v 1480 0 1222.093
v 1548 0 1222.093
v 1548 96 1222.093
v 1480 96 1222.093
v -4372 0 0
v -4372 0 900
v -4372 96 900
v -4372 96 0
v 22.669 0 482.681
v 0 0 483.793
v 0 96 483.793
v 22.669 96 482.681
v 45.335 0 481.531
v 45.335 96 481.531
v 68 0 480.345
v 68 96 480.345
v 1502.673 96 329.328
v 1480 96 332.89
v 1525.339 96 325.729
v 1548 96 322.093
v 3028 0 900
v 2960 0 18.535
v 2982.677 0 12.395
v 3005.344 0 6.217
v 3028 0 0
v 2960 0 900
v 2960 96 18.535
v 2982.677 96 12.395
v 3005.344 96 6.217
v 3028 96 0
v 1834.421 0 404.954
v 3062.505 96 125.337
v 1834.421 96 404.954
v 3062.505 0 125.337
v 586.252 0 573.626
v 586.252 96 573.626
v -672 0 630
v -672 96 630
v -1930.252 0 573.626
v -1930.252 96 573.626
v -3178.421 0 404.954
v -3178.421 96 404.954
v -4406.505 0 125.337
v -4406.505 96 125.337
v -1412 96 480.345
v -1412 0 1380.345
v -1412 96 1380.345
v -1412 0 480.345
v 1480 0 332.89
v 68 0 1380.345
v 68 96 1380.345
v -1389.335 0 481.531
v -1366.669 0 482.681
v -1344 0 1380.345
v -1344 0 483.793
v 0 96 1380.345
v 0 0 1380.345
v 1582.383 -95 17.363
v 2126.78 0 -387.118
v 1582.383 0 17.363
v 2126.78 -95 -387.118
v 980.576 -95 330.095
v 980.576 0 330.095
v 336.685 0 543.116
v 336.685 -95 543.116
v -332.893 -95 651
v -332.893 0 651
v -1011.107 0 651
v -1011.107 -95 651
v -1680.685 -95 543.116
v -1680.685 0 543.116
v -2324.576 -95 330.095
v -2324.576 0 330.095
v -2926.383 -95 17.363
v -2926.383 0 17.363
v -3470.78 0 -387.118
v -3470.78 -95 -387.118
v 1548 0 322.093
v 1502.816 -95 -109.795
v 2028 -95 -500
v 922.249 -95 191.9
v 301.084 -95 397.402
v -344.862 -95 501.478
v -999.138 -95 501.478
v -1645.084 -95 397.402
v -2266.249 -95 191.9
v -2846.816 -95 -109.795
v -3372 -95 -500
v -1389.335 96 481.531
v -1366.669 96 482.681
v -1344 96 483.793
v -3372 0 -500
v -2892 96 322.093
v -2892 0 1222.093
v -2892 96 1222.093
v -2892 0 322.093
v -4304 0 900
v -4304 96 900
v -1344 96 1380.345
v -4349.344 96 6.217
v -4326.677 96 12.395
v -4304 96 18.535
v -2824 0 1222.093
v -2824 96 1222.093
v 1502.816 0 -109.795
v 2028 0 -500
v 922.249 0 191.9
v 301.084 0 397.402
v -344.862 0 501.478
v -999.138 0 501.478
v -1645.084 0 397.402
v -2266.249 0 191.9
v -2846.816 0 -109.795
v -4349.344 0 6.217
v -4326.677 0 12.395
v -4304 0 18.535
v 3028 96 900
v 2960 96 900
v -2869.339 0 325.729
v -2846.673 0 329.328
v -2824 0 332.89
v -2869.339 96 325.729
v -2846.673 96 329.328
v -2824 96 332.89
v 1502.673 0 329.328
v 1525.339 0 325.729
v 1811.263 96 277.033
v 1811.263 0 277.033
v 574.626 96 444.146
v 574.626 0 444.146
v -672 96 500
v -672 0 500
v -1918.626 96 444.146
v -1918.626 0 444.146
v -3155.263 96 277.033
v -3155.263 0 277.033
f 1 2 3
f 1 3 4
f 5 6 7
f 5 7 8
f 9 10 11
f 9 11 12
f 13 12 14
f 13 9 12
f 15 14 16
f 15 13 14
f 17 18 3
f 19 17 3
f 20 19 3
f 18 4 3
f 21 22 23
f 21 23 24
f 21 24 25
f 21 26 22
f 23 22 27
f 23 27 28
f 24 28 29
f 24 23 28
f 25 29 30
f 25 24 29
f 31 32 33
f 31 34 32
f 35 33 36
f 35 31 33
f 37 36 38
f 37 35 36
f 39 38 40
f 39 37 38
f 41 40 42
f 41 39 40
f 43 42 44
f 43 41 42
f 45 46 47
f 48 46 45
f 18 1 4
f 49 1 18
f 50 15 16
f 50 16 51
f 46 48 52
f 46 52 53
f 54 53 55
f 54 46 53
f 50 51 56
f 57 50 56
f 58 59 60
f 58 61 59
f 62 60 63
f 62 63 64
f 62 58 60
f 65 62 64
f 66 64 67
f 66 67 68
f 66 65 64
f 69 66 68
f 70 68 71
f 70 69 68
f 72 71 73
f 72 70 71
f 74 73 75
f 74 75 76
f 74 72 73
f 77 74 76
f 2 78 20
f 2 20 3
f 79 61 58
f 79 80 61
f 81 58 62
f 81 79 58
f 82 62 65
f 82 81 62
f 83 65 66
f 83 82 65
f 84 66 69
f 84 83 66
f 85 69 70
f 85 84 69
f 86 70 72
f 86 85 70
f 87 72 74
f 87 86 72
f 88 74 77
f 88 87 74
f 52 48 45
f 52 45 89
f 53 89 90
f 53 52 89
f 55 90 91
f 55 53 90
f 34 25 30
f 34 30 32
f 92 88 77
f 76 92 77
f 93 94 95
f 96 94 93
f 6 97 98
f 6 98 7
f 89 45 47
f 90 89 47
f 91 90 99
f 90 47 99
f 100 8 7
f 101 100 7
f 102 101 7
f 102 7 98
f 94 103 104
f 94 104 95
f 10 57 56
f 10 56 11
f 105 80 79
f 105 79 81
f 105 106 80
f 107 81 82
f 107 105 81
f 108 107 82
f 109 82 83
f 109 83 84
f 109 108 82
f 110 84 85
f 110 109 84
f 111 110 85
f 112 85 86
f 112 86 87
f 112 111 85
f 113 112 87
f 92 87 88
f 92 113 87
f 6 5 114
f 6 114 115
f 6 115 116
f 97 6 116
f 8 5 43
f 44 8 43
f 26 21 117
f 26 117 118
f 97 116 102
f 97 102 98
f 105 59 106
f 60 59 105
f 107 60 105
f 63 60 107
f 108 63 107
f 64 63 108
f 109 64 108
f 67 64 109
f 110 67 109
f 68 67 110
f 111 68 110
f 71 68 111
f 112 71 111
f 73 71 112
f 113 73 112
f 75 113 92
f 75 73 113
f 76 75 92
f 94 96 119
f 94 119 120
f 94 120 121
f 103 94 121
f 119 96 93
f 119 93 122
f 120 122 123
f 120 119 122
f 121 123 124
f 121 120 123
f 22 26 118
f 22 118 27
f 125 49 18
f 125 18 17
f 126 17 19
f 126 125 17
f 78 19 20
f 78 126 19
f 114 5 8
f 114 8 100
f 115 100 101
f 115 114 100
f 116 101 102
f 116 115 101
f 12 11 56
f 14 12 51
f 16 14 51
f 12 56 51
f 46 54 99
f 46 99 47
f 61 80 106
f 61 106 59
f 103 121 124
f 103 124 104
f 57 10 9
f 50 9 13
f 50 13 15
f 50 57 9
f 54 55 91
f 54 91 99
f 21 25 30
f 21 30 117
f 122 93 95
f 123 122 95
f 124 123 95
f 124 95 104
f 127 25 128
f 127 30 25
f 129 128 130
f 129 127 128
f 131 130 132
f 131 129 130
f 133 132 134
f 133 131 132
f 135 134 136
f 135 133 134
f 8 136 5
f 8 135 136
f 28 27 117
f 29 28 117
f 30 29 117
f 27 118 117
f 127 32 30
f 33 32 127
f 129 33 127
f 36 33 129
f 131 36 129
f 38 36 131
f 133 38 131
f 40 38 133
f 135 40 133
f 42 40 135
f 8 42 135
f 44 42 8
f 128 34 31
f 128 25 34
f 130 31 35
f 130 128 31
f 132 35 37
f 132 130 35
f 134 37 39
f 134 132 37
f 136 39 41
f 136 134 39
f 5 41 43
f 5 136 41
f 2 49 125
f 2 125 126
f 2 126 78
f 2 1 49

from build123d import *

# Parameters (mm, degrees)
F1_E7_W  = 150
F1_E7_H  = 95
F3_E9_W  = 130
F3_E9_H  = 96
F6_DEPTH = 96


with BuildPart() as f2:
    # F2: sweep along a path in F0
    with BuildLine(Plane.XZ) as f2_path:
        ThreePointArc((2028, -500), (-672, 514.5502758917), (-3372, -500))
    # F1_E7 (on explicit) → F2 (sweep)
    with BuildSketch(Plane(origin=(-3372, 0, -500), x_dir=(-0.6585365854, 0, 0.7525487132), z_dir=(0.7525487132, 0, 0.6585365854))):
        with Locations((75, 47.5)):
            Rectangle(F1_E7_W, F1_E7_H)
    sweep(path=f2_path.line)


with BuildPart() as f4:
    # F4: sweep along a path in F0
    with BuildLine(Plane.XZ) as f4_path:
        ThreePointArc((3028, 0), (-672, 500), (-4372, 0))
    # F3_E9 (on explicit) → F4 (sweep)
    with BuildSketch(Plane(origin=(-4372, 0, 0), x_dir=(-0.2654232425, 0, 0.9641319943), z_dir=(0.9641319943, 0, 0.2654232425))):
        with Locations((65, 48)):
            Rectangle(F3_E9_W, F3_E9_H)
    sweep(path=f4_path.line)


with BuildPart() as f4_1:
    # F5: moved
    add(f4.part.moved(Location((0, 96, 0))))


with BuildPart() as f6:
    # F0 (on Front) → F6 (new body)
    with BuildSketch(Plane.XZ):
        with BuildLine():
            Line((-4372, 900), (-4372, 0))
            ThreePointArc((-4372, 0), (-4338.0117144615, 9.3106927244), (-4304, 18.5354329511))
            Line((-4304, 18.5354329511), (-4304, 900))
            Line((-4304, 900), (-4372, 900))
        make_face()
    extrude(amount=-F6_DEPTH)


with BuildPart() as f6b:
    # F0 (on Front) → F6, piece 2 (new body)
    with BuildSketch(Plane.XZ):
        with BuildLine():
            Line((-2892, 1222.0928640959), (-2892, 322.0928640959))
            ThreePointArc((-2892, 322.0928640959), (-2858.0066660368, 327.5333613557), (-2824, 332.8898928293))
            Line((-2824, 332.8898928293), (-2824, 1222.0928640959))
            Line((-2824, 1222.0928640959), (-2892, 1222.0928640959))
        make_face()
    extrude(amount=-F6_DEPTH)


with BuildPart() as f6c:
    # F0 (on Front) → F6, piece 3 (new body)
    with BuildSketch(Plane.XZ):
        with BuildLine():
            ThreePointArc((-1412, 480.3448233153), (-1378.0021053501, 482.1105090874), (-1344, 483.793161348))
            Line((-1344, 483.793161348), (-1344, 1380.3448233153))
            Line((-1344, 1380.3448233153), (-1412, 1380.3448233153))
            Line((-1412, 1380.3448233153), (-1412, 480.3448233153))
        make_face()
    extrude(amount=-F6_DEPTH)


with BuildPart() as f6d:
    # F0 (on Front) → F6, piece 4 (new body)
    with BuildSketch(Plane.XZ):
        with BuildLine():
            Line((0, 1380.3448233152), (0, 483.793161348))
            ThreePointArc((0, 483.793161348), (34.0021053501, 482.1105090874), (68, 480.3448233153))
            Line((68, 480.3448233152), (68, 1380.3448233152))
            Line((68, 1380.3448233152), (0, 1380.3448233152))
        make_face()
    extrude(amount=-F6_DEPTH)


with BuildPart() as f6e:
    # F0 (on Front) → F6, piece 5 (new body)
    with BuildSketch(Plane.XZ):
        with BuildLine():
            ThreePointArc((1480, 332.8898928293), (1514.0066660368, 327.5333613557), (1548, 322.0928640959))
            Line((1548, 322.0928640959), (1548, 1222.0928640959))
            Line((1548, 1222.0928640959), (1480, 1222.0928640959))
            Line((1480, 1222.0928640959), (1480, 332.8898928293))
        make_face()
    extrude(amount=-F6_DEPTH)


with BuildPart() as f6f:
    # F0 (on Front) → F6, piece 6 (new body)
    with BuildSketch(Plane.XZ):
        with BuildLine():
            ThreePointArc((2960, 18.5354329511), (2994.0117144615, 9.3106927244), (3028, 0))
            Line((3028, 0), (3028, 900))
            Line((3028, 900), (2960, 900))
            Line((2960, 900), (2960, 18.5354329511))
        make_face()
    extrude(amount=-F6_DEPTH)


solid = Compound([f2.part, f4_1.part, f6.part, f6b.part, f6c.part, f6d.part, f6e.part, f6f.part])
